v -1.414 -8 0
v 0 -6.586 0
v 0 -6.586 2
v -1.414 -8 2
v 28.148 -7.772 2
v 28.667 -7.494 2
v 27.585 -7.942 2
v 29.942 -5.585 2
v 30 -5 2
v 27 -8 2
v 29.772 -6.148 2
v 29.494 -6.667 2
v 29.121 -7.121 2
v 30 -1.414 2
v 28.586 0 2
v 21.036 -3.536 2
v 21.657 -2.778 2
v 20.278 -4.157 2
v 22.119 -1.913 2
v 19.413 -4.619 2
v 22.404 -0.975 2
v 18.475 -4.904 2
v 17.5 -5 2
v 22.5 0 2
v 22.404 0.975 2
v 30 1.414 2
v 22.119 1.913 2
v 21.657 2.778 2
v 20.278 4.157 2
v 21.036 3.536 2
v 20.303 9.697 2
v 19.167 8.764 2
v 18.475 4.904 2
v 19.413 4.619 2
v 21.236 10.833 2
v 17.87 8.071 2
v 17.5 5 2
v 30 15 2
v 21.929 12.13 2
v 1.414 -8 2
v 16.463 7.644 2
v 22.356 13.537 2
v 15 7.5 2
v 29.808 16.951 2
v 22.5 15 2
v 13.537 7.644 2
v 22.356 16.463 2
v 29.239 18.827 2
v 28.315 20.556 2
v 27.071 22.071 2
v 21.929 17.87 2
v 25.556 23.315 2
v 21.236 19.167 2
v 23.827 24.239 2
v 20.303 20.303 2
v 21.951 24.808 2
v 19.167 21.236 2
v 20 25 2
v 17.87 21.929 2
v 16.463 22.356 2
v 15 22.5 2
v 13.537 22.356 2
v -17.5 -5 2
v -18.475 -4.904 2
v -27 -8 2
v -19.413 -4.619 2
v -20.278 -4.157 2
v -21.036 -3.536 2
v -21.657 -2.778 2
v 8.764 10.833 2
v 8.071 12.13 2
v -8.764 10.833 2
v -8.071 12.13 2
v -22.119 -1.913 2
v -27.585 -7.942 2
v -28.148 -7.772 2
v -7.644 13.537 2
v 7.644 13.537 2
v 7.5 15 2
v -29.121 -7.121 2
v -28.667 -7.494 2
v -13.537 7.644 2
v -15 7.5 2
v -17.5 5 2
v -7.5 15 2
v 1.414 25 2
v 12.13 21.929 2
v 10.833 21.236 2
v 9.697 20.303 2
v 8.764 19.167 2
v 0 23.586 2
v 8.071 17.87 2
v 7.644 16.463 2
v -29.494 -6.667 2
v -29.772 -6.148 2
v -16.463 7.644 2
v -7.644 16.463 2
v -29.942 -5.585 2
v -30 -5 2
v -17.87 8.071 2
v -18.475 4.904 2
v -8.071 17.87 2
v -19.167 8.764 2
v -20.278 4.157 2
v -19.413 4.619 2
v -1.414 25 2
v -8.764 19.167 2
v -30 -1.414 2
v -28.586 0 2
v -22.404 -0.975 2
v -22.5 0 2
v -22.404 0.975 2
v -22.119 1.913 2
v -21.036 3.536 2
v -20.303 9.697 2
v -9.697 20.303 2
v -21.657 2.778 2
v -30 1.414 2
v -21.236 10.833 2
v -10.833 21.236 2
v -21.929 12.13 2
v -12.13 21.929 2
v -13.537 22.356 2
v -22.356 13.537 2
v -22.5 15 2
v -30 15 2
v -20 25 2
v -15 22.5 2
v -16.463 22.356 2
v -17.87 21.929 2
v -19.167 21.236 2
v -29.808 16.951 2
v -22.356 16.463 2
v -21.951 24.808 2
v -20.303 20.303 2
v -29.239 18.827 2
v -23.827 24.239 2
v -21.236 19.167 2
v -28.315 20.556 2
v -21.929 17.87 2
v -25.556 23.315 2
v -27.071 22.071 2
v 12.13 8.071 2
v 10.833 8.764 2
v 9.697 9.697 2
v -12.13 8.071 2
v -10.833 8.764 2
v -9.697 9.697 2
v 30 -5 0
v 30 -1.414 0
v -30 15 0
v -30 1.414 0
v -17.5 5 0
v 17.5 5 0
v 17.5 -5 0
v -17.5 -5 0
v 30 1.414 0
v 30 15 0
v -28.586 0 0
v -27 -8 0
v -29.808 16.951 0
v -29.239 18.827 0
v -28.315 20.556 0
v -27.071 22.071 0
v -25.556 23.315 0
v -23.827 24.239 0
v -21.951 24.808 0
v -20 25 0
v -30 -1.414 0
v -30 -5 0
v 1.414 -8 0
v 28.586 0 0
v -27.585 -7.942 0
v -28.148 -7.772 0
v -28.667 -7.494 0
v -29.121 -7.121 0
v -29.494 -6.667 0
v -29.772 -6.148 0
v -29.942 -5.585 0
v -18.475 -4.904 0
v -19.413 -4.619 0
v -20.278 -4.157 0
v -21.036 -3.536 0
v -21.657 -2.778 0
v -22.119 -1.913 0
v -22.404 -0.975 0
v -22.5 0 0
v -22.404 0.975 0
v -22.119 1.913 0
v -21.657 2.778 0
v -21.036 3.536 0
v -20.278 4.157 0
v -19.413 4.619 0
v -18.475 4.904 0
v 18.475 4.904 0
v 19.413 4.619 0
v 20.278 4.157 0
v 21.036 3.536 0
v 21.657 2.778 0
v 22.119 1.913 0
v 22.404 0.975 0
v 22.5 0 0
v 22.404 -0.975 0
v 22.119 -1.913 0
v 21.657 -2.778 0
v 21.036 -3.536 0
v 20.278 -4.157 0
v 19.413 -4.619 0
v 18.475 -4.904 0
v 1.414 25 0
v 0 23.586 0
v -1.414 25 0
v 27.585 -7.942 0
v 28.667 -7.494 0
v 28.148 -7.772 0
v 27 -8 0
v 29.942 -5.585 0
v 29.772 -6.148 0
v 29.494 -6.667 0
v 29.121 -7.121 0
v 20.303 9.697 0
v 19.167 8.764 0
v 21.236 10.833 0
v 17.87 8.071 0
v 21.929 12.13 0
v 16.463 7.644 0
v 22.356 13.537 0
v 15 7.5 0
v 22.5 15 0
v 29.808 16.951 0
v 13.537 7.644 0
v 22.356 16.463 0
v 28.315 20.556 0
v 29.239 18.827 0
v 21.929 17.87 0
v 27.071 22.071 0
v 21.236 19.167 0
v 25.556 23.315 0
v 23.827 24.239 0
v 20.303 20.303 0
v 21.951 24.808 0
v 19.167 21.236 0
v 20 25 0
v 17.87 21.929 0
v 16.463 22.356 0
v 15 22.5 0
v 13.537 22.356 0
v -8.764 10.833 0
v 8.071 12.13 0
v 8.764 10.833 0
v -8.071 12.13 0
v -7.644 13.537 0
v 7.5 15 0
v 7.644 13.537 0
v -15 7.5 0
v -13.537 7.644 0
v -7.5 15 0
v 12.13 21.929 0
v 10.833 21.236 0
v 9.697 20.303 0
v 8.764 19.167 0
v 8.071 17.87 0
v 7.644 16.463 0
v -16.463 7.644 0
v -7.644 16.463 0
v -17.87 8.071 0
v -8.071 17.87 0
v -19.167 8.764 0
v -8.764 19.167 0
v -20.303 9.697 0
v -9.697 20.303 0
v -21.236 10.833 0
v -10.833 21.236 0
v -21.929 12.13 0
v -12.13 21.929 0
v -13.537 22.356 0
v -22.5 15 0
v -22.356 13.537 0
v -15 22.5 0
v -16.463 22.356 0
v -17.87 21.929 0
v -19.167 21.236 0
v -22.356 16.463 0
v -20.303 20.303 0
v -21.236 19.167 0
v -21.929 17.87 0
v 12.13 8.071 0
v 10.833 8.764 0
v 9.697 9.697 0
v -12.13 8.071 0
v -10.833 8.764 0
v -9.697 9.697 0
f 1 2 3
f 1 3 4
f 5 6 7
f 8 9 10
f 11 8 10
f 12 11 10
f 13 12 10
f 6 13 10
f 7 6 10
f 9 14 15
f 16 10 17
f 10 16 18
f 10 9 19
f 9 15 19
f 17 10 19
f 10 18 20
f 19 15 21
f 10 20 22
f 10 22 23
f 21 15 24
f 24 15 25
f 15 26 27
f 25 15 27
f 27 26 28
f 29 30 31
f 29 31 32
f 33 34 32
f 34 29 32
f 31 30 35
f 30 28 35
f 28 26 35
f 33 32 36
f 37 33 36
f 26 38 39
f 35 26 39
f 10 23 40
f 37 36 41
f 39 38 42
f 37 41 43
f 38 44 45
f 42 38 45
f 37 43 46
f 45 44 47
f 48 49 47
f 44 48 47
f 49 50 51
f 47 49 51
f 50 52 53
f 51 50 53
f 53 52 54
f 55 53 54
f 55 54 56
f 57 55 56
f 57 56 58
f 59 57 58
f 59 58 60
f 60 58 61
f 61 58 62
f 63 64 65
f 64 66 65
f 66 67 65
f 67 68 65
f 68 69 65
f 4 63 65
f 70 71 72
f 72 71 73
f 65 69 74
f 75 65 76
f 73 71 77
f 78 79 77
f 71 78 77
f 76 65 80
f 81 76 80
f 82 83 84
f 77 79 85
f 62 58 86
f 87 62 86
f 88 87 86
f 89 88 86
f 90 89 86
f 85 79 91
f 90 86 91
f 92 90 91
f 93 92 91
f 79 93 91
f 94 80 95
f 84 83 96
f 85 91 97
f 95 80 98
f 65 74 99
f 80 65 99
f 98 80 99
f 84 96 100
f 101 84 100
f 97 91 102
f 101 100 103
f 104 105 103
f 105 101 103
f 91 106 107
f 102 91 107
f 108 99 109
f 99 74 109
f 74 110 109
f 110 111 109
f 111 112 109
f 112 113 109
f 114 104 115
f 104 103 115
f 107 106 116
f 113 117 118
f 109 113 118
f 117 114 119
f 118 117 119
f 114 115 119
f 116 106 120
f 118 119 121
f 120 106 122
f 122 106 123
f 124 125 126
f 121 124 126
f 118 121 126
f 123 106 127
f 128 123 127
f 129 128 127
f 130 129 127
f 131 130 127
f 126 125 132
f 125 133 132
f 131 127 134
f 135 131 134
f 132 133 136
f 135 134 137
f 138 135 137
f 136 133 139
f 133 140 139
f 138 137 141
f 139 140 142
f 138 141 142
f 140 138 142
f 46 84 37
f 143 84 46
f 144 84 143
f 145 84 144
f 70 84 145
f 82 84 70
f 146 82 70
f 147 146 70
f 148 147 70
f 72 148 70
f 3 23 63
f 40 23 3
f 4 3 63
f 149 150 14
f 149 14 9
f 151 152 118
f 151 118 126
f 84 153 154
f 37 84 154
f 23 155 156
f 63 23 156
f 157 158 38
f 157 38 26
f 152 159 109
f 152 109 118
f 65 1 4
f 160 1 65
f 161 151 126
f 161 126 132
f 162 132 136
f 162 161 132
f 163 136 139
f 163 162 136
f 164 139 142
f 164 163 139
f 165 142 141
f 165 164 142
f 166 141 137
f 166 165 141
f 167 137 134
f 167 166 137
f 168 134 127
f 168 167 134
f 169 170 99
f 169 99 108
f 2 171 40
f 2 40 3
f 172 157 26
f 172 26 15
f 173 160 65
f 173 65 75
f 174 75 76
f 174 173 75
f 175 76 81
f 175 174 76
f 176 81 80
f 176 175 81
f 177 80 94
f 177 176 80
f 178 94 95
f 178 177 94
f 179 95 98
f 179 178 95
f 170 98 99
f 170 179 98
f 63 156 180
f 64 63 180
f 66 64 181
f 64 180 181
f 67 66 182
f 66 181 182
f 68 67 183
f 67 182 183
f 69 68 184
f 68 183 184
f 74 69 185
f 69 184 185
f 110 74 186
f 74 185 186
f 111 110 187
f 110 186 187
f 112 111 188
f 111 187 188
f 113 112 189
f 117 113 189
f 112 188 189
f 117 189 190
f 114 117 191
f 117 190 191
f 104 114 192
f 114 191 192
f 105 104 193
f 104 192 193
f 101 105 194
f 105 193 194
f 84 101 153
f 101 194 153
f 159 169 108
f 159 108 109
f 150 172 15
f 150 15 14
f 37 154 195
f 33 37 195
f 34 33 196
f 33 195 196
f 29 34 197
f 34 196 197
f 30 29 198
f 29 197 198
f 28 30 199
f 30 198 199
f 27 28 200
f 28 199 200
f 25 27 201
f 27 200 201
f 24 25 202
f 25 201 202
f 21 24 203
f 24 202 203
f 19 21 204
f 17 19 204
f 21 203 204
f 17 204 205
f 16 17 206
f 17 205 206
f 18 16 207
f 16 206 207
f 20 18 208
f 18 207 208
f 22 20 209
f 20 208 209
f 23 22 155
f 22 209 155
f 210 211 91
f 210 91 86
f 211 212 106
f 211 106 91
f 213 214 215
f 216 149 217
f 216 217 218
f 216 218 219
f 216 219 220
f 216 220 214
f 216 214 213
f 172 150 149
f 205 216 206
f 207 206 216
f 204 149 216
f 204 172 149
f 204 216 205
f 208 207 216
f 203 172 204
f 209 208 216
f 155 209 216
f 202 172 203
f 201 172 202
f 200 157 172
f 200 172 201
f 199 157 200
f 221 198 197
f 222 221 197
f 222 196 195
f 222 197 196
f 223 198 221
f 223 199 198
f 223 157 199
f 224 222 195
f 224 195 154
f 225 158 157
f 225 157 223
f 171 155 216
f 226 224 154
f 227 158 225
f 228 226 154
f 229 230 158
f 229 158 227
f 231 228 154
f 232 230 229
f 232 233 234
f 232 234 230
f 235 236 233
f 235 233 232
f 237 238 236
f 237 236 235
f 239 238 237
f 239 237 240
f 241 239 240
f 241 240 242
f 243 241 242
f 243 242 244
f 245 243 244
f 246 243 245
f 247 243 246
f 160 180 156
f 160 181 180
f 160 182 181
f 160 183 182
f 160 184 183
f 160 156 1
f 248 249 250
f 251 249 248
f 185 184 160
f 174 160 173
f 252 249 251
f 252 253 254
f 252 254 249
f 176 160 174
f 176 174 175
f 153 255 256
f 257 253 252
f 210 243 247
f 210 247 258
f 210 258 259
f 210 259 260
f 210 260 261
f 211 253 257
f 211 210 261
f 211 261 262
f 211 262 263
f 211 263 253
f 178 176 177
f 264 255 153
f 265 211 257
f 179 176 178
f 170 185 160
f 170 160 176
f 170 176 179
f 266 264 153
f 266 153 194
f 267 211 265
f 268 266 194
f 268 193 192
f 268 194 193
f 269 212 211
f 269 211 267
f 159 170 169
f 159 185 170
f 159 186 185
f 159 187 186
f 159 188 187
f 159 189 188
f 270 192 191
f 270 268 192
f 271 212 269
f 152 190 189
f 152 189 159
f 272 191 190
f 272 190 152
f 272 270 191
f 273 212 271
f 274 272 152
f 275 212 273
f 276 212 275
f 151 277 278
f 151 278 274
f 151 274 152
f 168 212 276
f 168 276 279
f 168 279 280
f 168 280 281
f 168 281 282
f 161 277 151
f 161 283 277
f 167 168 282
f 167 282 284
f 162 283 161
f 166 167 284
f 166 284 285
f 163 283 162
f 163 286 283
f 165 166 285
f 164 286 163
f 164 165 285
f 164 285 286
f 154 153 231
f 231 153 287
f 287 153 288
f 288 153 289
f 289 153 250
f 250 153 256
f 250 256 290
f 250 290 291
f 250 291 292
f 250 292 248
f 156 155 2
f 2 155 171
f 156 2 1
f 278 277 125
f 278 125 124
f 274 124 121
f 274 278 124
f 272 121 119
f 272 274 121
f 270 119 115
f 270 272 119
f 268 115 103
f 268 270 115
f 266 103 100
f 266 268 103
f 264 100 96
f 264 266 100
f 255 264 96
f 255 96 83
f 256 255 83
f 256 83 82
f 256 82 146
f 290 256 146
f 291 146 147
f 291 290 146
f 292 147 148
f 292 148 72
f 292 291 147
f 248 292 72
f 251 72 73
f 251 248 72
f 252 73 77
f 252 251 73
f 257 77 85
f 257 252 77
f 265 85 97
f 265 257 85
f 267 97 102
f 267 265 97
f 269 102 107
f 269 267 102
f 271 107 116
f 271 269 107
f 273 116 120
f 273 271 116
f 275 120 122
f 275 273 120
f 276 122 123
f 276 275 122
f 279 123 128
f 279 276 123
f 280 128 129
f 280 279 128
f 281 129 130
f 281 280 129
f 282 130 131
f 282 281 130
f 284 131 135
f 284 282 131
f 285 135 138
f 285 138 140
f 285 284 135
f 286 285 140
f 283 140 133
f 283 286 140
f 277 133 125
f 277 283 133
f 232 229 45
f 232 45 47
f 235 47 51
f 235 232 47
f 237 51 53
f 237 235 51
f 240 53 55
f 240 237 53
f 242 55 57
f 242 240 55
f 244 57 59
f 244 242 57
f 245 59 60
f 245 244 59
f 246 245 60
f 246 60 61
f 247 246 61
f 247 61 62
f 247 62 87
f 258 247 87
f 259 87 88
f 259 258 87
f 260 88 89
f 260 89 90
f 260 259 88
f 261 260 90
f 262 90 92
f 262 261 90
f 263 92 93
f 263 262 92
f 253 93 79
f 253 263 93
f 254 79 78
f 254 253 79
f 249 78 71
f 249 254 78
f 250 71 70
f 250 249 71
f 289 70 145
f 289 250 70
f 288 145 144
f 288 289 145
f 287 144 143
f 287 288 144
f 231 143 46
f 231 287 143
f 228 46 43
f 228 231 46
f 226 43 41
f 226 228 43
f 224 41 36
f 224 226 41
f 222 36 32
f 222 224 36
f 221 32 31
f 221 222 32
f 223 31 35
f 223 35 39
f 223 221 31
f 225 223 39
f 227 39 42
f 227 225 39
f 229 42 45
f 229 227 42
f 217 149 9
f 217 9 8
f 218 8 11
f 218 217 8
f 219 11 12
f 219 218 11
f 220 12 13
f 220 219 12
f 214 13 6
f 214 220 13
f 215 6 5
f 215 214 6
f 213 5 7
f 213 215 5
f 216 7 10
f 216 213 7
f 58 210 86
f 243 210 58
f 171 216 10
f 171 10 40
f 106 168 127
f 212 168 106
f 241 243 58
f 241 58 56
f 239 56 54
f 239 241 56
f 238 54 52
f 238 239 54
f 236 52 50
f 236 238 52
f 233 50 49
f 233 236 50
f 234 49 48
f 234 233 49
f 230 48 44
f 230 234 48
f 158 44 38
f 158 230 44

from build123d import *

# Parameters (mm, degrees)
SKETCH1_R           = 7.5
BOSS_EXTRUDE1_DEPTH = 2


with BuildPart() as part:
    # Sketch1 → Boss-Extrude1 (new body)
    with BuildSketch(Plane.XY):
        with BuildLine():
            Line((-20, 25), (-1.414213562, 25))
            Line((-1.414213562, 25), (0, 23.585786438))
            Line((0, 23.585786438), (1.414213562, 25))
            Line((1.414213562, 25), (20, 25))
            ThreePointArc((20, 25), (27.071067812, 22.071067812), (30, 15))
            Line((30, 15), (30, 1.414213562))
            Line((30, 1.414213562), (28.585786438, 0))
            Line((28.585786438, 0), (30, -1.414213562))
            Line((30, -1.414213562), (30, -5))
            ThreePointArc((30, -5), (29.121320344, -7.121320344), (27, -8))
            Line((27, -8), (1.414213562, -8))
            Line((1.414213562, -8), (0, -6.585786438))
            Line((0, -6.585786438), (-1.414213562, -8))
            Line((-1.414213562, -8), (-27, -8))
            ThreePointArc((-27, -8), (-29.121320344, -7.121320344), (-30, -5))
            Line((-30, -5), (-30, -1.414213562))
            Line((-30, -1.414213562), (-28.585786438, 0))
            Line((-28.585786438, 0), (-30, 1.414213562))
            Line((-30, 1.414213562), (-30, 15))
            ThreePointArc((-30, 15), (-27.071067812, 22.071067812), (-20, 25))
        make_face()
        with Locations((15, 15)):
            Circle(SKETCH1_R, mode=Mode.SUBTRACT)
        with Locations(Location((-15, 15, 0), (0, 0, 180))):
            Circle(SKETCH1_R, mode=Mode.SUBTRACT)
        with BuildLine():
            Line((-17.5, 5), (17.5, 5))
            ThreePointArc((17.5, 5), (22.5, 0), (17.5, -5))
            Line((17.5, -5), (-17.5, -5))
            ThreePointArc((-17.5, -5), (-22.5, 0), (-17.5, 5))
        make_face(mode=Mode.SUBTRACT)
    extrude(amount=BOSS_EXTRUDE1_DEPTH)


solid = part.part
